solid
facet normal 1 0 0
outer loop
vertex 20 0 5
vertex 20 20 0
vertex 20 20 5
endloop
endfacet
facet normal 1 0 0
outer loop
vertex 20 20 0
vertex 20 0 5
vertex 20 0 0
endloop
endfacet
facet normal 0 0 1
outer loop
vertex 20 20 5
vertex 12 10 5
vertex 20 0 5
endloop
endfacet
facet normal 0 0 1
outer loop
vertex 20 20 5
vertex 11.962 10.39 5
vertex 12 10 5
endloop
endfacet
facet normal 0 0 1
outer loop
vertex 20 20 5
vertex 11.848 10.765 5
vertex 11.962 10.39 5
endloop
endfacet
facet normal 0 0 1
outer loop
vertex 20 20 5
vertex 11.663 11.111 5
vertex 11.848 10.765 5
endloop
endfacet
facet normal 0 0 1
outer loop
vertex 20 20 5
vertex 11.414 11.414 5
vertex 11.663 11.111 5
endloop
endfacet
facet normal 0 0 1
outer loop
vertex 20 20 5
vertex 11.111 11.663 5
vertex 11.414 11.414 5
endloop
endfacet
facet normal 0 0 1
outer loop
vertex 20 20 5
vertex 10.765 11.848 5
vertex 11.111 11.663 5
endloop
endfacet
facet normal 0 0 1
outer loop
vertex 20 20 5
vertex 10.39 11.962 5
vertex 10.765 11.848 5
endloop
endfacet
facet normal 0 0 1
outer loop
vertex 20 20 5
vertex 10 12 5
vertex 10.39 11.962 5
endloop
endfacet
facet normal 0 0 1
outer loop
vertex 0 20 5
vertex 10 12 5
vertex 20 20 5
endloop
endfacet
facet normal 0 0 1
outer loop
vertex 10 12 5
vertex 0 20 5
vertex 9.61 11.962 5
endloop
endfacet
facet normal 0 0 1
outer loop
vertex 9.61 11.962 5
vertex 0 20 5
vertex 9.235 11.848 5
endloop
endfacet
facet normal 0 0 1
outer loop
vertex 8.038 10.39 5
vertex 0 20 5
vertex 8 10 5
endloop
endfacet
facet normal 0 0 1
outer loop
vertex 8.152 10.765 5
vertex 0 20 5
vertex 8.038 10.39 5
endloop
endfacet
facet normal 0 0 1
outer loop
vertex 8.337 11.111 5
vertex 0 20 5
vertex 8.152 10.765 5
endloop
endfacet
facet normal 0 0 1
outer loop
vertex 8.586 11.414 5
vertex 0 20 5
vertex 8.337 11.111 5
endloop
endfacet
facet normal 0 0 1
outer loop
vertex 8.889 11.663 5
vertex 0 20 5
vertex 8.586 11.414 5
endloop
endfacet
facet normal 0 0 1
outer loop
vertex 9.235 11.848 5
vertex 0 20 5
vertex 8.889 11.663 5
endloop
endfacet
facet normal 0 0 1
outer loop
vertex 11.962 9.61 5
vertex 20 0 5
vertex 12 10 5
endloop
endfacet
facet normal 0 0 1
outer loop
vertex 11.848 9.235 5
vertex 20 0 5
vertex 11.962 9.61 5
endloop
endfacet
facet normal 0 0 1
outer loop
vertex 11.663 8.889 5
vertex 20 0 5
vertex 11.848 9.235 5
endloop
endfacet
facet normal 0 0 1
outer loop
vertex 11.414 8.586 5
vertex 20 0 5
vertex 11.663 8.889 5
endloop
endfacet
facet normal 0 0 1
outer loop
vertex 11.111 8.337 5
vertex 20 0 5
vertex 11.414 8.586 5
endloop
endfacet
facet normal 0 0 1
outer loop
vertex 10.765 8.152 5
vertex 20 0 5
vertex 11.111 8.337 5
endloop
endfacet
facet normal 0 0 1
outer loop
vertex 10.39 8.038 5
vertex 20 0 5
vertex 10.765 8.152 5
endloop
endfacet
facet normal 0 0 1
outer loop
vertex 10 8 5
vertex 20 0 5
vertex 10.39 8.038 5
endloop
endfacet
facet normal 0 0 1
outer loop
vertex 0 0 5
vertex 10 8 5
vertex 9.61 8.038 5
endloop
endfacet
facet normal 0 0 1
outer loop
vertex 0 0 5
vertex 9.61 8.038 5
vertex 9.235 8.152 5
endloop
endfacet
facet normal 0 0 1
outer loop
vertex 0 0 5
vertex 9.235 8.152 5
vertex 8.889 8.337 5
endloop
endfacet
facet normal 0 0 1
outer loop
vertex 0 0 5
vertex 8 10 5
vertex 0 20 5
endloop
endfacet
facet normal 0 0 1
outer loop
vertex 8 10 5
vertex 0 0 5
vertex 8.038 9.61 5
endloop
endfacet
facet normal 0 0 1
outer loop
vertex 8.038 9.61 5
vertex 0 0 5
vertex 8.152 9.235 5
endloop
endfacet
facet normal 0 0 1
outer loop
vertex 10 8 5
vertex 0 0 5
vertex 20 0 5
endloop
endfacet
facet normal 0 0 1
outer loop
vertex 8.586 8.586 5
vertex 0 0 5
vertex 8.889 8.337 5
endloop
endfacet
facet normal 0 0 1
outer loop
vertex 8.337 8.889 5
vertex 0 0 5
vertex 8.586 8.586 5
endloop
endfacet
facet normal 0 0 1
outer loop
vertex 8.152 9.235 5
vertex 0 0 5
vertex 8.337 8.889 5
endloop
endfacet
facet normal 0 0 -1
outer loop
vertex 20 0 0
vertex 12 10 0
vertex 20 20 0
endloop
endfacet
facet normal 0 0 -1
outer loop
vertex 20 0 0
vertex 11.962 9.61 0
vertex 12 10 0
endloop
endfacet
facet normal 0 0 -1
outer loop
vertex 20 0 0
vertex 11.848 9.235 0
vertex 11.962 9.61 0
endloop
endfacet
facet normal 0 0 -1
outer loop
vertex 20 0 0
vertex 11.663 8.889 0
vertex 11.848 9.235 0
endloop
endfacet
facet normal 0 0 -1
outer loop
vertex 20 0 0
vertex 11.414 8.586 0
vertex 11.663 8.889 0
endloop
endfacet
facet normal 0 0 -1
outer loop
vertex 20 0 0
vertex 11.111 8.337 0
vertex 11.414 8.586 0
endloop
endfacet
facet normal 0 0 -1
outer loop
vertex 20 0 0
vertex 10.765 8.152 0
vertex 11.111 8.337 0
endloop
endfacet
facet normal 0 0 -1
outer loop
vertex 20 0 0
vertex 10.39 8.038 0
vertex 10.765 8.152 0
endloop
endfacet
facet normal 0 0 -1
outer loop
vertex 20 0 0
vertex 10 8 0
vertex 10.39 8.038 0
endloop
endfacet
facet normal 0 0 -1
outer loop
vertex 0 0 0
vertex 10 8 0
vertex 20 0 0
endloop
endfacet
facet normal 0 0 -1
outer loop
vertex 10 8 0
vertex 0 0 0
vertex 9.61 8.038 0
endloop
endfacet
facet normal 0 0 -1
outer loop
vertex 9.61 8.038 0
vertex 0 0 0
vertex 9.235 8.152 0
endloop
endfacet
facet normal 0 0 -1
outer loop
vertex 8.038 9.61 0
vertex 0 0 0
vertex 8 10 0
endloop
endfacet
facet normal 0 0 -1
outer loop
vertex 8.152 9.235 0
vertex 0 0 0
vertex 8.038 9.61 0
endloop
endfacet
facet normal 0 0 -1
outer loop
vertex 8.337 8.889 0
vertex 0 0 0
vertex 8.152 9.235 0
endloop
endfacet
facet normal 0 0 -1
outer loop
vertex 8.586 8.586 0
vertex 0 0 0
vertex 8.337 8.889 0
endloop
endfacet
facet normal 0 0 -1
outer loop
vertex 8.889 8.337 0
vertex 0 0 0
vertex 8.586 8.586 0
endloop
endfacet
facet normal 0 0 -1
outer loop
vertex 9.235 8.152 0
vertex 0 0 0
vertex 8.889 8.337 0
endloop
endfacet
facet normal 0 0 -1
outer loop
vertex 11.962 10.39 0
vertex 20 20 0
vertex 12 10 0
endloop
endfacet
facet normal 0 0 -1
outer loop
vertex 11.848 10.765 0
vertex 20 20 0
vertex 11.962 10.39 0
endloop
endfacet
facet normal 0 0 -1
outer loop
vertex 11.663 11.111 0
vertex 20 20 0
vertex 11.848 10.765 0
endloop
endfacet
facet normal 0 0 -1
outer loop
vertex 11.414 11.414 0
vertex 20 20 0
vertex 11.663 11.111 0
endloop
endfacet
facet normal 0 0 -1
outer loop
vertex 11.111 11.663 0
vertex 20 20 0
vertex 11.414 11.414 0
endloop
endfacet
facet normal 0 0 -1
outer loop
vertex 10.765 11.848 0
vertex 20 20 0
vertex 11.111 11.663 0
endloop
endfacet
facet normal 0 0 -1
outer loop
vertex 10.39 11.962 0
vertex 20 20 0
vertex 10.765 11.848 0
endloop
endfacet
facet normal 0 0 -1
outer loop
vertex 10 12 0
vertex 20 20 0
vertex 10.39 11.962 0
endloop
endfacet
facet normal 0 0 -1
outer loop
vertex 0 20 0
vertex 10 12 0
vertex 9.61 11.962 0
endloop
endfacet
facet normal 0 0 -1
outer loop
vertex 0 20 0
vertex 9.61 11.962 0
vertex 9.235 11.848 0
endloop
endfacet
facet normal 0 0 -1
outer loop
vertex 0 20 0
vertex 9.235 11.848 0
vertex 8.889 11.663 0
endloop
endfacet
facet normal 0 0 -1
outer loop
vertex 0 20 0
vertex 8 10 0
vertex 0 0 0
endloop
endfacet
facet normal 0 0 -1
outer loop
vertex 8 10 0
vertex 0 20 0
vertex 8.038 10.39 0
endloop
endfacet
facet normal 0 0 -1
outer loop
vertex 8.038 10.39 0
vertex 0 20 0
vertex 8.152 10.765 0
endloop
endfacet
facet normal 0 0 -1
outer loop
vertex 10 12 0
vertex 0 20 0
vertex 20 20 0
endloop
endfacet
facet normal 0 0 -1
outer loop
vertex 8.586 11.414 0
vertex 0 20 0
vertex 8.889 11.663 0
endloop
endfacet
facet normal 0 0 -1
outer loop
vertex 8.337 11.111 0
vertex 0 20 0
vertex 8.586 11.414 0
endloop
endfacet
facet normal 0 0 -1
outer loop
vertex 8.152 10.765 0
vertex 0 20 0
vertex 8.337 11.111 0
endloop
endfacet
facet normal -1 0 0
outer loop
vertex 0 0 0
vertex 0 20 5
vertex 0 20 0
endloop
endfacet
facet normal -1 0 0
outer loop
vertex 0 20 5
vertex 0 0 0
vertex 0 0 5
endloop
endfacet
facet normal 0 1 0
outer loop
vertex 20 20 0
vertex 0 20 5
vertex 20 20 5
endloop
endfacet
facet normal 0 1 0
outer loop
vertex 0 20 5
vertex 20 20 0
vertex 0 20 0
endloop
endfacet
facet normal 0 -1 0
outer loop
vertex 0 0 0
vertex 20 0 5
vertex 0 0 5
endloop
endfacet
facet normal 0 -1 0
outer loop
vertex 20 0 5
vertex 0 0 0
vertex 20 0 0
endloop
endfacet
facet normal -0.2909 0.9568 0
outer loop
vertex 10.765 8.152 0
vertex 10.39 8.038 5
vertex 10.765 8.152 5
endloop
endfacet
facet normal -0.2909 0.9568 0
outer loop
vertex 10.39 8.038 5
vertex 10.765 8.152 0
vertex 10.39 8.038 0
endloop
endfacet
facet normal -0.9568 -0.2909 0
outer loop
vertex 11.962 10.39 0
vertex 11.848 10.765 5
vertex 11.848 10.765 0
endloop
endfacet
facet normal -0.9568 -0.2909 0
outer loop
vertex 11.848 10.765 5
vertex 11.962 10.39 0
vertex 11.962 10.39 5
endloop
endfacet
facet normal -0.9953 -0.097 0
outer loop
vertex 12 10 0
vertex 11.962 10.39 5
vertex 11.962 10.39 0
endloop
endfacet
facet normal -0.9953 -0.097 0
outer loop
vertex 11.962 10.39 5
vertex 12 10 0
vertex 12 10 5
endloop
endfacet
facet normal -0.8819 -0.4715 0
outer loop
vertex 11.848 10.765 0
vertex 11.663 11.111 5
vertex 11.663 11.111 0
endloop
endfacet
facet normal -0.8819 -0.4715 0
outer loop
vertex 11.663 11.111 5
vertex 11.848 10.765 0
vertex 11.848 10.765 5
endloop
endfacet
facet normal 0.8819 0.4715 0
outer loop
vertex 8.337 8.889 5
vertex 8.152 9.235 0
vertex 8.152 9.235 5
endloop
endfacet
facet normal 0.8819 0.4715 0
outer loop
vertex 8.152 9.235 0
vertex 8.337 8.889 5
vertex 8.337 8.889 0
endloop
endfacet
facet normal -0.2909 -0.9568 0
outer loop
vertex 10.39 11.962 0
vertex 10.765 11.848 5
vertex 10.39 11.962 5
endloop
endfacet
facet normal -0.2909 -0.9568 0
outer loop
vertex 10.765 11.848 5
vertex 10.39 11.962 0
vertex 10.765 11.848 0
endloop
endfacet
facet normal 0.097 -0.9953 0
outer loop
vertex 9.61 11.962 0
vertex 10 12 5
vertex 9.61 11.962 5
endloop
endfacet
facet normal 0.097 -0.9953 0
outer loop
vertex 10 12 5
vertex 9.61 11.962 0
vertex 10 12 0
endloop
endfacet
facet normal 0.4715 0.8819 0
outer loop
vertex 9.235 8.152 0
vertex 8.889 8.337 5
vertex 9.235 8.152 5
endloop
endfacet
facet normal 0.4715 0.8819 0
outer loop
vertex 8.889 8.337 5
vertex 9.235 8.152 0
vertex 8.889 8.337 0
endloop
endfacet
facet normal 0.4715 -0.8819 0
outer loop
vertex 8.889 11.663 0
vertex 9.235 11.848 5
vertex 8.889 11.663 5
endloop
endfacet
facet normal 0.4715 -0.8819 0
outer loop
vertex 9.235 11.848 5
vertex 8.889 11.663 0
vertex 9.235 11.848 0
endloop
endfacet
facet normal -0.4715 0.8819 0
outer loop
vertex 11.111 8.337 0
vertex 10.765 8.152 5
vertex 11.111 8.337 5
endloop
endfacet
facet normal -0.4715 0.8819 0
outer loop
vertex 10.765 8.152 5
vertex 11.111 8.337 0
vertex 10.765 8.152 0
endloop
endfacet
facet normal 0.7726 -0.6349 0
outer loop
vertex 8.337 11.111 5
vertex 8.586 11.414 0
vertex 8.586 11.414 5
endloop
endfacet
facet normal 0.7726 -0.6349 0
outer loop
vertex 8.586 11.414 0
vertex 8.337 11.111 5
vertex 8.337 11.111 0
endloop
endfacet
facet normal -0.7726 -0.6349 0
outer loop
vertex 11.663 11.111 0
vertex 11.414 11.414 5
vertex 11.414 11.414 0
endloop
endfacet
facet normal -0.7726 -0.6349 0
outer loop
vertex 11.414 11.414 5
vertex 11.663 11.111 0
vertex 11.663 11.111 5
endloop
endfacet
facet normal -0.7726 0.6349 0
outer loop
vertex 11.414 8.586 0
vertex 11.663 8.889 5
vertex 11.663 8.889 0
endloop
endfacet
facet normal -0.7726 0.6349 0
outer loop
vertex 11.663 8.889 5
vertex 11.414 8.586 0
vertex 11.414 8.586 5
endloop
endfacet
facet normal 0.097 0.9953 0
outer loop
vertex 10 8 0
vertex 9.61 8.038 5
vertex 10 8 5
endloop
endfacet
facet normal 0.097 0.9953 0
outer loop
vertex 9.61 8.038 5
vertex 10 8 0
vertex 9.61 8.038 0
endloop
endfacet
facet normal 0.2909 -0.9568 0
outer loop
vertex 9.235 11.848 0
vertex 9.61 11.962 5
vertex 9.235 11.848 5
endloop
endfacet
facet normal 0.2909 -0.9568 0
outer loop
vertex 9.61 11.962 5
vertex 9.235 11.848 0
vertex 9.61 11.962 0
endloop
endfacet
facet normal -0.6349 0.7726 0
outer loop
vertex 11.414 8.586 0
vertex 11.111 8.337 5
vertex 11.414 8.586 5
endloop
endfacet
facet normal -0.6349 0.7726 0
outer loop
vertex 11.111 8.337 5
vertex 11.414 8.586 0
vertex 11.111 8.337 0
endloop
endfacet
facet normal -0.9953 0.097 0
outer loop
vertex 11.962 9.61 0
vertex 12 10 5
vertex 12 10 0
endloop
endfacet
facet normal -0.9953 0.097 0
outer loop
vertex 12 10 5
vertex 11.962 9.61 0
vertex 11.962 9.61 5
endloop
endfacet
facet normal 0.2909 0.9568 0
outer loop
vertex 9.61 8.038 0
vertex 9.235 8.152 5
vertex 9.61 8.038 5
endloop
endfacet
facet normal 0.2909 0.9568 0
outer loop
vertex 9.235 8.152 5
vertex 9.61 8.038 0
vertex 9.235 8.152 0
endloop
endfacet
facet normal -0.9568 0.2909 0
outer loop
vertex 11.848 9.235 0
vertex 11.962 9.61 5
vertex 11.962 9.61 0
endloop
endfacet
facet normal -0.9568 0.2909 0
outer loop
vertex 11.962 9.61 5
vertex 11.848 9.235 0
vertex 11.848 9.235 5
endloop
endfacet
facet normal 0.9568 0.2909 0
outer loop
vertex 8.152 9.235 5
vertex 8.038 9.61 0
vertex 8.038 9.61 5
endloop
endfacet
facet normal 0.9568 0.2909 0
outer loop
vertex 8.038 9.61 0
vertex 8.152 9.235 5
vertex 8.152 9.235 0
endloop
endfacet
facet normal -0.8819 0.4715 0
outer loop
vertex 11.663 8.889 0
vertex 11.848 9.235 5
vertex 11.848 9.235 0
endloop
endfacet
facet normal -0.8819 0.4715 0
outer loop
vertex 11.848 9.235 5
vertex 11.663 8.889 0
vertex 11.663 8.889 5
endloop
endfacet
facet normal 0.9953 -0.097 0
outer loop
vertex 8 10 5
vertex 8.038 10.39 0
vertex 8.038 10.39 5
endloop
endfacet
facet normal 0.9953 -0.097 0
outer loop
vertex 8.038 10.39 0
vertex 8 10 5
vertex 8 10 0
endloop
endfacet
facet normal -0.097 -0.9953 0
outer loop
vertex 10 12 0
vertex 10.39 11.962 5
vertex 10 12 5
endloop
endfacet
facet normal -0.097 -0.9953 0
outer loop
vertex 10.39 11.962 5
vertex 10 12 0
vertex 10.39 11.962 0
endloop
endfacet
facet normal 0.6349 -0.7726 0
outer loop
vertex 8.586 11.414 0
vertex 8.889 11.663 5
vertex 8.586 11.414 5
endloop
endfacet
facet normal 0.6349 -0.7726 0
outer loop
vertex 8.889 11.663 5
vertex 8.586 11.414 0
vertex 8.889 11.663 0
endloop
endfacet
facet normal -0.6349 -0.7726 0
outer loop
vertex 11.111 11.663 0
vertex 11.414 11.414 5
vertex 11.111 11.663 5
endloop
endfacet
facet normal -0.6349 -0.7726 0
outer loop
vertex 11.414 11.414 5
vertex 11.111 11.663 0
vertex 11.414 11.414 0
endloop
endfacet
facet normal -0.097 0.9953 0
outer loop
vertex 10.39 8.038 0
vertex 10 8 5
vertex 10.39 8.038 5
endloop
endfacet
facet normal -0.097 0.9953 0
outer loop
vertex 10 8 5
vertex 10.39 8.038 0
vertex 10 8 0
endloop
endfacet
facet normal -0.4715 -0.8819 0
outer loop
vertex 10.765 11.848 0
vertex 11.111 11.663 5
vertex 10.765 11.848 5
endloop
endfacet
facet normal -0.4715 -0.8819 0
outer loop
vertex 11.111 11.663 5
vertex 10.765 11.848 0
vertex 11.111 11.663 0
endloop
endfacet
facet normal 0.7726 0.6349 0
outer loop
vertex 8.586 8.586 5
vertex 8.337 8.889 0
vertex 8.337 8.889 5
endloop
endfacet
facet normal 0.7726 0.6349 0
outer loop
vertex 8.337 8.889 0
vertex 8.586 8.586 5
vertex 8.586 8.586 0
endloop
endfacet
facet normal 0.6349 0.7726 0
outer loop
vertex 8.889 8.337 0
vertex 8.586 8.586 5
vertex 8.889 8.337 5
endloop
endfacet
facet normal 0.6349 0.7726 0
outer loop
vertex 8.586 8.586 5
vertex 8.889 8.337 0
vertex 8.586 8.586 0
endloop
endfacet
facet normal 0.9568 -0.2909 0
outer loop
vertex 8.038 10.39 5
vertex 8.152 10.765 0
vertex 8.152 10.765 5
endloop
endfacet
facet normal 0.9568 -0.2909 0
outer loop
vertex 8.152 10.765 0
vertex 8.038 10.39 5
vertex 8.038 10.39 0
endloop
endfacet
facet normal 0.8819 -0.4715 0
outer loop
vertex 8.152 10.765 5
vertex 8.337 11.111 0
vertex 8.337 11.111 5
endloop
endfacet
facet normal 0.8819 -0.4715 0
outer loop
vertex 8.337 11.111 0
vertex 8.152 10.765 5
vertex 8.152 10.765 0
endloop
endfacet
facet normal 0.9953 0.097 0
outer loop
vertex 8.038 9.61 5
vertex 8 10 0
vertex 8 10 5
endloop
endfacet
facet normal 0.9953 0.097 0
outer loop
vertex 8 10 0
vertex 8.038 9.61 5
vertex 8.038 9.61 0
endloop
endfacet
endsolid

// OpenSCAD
part="body";
hole=2;
if(part=="body") difference(){cube([20,20,5]);translate([10,10,-1])cylinder(h=7,r=hole,$fn=32);}
else if(part=="shell")translate([30,0,0])cube([10,10,5]);
